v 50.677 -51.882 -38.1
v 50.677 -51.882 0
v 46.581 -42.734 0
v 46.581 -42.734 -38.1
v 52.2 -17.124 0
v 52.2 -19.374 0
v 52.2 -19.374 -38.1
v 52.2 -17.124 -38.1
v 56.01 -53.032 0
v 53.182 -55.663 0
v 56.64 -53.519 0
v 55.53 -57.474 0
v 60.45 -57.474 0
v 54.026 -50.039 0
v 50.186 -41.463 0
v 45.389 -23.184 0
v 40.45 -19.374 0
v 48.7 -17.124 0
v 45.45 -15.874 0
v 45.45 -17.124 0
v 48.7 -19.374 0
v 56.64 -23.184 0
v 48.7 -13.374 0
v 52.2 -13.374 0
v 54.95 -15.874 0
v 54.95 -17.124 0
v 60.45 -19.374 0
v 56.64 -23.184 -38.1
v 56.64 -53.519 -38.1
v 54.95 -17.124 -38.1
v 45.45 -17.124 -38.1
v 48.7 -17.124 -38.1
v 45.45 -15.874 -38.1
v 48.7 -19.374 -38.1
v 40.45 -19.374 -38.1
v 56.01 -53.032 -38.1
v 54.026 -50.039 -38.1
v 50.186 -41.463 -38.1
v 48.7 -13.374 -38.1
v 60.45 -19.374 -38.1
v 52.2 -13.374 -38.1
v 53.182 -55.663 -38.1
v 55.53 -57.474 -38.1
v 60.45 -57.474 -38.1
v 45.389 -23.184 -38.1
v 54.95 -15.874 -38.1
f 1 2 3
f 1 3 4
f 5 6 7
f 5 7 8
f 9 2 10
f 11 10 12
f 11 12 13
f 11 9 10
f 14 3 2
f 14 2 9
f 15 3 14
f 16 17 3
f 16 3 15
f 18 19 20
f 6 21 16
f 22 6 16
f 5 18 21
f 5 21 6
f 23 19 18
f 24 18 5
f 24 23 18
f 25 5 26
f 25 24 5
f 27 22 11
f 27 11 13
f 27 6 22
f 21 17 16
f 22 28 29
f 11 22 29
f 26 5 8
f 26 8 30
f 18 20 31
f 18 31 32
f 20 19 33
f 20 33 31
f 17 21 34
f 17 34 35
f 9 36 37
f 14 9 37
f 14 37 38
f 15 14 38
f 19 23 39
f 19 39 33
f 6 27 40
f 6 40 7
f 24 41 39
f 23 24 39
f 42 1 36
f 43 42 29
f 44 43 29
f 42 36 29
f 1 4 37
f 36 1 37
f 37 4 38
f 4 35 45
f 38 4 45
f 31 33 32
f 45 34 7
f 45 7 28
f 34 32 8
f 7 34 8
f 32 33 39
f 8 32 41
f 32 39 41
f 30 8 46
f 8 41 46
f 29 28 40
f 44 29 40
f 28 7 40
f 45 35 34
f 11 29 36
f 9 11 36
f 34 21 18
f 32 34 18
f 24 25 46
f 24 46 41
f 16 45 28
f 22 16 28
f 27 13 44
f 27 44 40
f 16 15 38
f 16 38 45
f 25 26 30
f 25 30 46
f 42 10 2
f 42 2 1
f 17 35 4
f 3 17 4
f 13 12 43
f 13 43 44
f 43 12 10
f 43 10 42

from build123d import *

# Parameters (mm, degrees)
F1_DEPTH = 38.1
F2_SIZE  = 5.08
F3_SIZE  = 5.08
F4_SIZE  = 5.08
F5_T     = -3.81
F6_DEPTH = 25.4
F0_W     = 3.5
F0_H     = 2.25
F7_DEPTH = 38.1


with BuildPart() as f1:
    # F0 (on Top) → F1 (new body)
    with BuildSketch(Plane.XY):
        Polygon((52.1997908056, -19.3742188337), (48.6997908056, -19.3742188337), (40.4497908056, -19.3742188337), (50.4497908056, -57.4742188337), (60.4497908056, -57.4742188337), (60.4497908056, -19.3742188337), align=None)
    extrude(amount=-F1_DEPTH)

    # F2
    f2_edges = [f1.edges().sort_by_distance(p)[0] for p in [
        (50.449791, -57.474219, -19.05),
    ]]
    chamfer(f2_edges, length=F2_SIZE)

    # F3
    f3_edges = [f1.edges().sort_by_distance(p)[0] for p in [
        (49.160139, -52.560646, -19.05),
    ]]
    chamfer(f3_edges, length=F3_SIZE)

    # F4
    f4_edges = [f1.edges().sort_by_distance(p)[0] for p in [
        (47.870487, -47.647073, -19.05),
    ]]
    chamfer(f4_edges, length=F4_SIZE)

    # F5
    f5_openings = [f1.faces().sort_by_distance(p)[0] for p in [
        (52.764065, -35.551883, -38.1),
    ]]
    offset(amount=F5_T, openings=f5_openings)

    # F6 (cut): a face of the model
    f6_faces = [f1.faces().sort_by_distance(p)[0] for p in [
        (52.597107383, -34.5596646163, -3.81),
    ]]
    extrude(f6_faces, amount=-F6_DEPTH, mode=Mode.SUBTRACT)

    # F0 (on Top) → F7 (join)
    with BuildSketch(Plane.XY):
        with Locations((50.4497908056, -18.2492188337)):
            Rectangle(F0_W, F0_H)
        Polygon((45.4497908056, -17.1242188337), (48.6997908056, -17.1242188337), (52.1997908056, -17.1242188337), (54.9497908056, -17.1242188337), (54.9497908056, -15.8742188337), (45.4497908056, -15.8742188337), align=None)
        Polygon((48.6997908056, -13.3742188337), (45.4497908056, -15.8742188337), (54.9497908056, -15.8742188337), (52.1997908056, -13.3742188337), align=None)
    extrude(amount=-F7_DEPTH)


solid = f1.part
